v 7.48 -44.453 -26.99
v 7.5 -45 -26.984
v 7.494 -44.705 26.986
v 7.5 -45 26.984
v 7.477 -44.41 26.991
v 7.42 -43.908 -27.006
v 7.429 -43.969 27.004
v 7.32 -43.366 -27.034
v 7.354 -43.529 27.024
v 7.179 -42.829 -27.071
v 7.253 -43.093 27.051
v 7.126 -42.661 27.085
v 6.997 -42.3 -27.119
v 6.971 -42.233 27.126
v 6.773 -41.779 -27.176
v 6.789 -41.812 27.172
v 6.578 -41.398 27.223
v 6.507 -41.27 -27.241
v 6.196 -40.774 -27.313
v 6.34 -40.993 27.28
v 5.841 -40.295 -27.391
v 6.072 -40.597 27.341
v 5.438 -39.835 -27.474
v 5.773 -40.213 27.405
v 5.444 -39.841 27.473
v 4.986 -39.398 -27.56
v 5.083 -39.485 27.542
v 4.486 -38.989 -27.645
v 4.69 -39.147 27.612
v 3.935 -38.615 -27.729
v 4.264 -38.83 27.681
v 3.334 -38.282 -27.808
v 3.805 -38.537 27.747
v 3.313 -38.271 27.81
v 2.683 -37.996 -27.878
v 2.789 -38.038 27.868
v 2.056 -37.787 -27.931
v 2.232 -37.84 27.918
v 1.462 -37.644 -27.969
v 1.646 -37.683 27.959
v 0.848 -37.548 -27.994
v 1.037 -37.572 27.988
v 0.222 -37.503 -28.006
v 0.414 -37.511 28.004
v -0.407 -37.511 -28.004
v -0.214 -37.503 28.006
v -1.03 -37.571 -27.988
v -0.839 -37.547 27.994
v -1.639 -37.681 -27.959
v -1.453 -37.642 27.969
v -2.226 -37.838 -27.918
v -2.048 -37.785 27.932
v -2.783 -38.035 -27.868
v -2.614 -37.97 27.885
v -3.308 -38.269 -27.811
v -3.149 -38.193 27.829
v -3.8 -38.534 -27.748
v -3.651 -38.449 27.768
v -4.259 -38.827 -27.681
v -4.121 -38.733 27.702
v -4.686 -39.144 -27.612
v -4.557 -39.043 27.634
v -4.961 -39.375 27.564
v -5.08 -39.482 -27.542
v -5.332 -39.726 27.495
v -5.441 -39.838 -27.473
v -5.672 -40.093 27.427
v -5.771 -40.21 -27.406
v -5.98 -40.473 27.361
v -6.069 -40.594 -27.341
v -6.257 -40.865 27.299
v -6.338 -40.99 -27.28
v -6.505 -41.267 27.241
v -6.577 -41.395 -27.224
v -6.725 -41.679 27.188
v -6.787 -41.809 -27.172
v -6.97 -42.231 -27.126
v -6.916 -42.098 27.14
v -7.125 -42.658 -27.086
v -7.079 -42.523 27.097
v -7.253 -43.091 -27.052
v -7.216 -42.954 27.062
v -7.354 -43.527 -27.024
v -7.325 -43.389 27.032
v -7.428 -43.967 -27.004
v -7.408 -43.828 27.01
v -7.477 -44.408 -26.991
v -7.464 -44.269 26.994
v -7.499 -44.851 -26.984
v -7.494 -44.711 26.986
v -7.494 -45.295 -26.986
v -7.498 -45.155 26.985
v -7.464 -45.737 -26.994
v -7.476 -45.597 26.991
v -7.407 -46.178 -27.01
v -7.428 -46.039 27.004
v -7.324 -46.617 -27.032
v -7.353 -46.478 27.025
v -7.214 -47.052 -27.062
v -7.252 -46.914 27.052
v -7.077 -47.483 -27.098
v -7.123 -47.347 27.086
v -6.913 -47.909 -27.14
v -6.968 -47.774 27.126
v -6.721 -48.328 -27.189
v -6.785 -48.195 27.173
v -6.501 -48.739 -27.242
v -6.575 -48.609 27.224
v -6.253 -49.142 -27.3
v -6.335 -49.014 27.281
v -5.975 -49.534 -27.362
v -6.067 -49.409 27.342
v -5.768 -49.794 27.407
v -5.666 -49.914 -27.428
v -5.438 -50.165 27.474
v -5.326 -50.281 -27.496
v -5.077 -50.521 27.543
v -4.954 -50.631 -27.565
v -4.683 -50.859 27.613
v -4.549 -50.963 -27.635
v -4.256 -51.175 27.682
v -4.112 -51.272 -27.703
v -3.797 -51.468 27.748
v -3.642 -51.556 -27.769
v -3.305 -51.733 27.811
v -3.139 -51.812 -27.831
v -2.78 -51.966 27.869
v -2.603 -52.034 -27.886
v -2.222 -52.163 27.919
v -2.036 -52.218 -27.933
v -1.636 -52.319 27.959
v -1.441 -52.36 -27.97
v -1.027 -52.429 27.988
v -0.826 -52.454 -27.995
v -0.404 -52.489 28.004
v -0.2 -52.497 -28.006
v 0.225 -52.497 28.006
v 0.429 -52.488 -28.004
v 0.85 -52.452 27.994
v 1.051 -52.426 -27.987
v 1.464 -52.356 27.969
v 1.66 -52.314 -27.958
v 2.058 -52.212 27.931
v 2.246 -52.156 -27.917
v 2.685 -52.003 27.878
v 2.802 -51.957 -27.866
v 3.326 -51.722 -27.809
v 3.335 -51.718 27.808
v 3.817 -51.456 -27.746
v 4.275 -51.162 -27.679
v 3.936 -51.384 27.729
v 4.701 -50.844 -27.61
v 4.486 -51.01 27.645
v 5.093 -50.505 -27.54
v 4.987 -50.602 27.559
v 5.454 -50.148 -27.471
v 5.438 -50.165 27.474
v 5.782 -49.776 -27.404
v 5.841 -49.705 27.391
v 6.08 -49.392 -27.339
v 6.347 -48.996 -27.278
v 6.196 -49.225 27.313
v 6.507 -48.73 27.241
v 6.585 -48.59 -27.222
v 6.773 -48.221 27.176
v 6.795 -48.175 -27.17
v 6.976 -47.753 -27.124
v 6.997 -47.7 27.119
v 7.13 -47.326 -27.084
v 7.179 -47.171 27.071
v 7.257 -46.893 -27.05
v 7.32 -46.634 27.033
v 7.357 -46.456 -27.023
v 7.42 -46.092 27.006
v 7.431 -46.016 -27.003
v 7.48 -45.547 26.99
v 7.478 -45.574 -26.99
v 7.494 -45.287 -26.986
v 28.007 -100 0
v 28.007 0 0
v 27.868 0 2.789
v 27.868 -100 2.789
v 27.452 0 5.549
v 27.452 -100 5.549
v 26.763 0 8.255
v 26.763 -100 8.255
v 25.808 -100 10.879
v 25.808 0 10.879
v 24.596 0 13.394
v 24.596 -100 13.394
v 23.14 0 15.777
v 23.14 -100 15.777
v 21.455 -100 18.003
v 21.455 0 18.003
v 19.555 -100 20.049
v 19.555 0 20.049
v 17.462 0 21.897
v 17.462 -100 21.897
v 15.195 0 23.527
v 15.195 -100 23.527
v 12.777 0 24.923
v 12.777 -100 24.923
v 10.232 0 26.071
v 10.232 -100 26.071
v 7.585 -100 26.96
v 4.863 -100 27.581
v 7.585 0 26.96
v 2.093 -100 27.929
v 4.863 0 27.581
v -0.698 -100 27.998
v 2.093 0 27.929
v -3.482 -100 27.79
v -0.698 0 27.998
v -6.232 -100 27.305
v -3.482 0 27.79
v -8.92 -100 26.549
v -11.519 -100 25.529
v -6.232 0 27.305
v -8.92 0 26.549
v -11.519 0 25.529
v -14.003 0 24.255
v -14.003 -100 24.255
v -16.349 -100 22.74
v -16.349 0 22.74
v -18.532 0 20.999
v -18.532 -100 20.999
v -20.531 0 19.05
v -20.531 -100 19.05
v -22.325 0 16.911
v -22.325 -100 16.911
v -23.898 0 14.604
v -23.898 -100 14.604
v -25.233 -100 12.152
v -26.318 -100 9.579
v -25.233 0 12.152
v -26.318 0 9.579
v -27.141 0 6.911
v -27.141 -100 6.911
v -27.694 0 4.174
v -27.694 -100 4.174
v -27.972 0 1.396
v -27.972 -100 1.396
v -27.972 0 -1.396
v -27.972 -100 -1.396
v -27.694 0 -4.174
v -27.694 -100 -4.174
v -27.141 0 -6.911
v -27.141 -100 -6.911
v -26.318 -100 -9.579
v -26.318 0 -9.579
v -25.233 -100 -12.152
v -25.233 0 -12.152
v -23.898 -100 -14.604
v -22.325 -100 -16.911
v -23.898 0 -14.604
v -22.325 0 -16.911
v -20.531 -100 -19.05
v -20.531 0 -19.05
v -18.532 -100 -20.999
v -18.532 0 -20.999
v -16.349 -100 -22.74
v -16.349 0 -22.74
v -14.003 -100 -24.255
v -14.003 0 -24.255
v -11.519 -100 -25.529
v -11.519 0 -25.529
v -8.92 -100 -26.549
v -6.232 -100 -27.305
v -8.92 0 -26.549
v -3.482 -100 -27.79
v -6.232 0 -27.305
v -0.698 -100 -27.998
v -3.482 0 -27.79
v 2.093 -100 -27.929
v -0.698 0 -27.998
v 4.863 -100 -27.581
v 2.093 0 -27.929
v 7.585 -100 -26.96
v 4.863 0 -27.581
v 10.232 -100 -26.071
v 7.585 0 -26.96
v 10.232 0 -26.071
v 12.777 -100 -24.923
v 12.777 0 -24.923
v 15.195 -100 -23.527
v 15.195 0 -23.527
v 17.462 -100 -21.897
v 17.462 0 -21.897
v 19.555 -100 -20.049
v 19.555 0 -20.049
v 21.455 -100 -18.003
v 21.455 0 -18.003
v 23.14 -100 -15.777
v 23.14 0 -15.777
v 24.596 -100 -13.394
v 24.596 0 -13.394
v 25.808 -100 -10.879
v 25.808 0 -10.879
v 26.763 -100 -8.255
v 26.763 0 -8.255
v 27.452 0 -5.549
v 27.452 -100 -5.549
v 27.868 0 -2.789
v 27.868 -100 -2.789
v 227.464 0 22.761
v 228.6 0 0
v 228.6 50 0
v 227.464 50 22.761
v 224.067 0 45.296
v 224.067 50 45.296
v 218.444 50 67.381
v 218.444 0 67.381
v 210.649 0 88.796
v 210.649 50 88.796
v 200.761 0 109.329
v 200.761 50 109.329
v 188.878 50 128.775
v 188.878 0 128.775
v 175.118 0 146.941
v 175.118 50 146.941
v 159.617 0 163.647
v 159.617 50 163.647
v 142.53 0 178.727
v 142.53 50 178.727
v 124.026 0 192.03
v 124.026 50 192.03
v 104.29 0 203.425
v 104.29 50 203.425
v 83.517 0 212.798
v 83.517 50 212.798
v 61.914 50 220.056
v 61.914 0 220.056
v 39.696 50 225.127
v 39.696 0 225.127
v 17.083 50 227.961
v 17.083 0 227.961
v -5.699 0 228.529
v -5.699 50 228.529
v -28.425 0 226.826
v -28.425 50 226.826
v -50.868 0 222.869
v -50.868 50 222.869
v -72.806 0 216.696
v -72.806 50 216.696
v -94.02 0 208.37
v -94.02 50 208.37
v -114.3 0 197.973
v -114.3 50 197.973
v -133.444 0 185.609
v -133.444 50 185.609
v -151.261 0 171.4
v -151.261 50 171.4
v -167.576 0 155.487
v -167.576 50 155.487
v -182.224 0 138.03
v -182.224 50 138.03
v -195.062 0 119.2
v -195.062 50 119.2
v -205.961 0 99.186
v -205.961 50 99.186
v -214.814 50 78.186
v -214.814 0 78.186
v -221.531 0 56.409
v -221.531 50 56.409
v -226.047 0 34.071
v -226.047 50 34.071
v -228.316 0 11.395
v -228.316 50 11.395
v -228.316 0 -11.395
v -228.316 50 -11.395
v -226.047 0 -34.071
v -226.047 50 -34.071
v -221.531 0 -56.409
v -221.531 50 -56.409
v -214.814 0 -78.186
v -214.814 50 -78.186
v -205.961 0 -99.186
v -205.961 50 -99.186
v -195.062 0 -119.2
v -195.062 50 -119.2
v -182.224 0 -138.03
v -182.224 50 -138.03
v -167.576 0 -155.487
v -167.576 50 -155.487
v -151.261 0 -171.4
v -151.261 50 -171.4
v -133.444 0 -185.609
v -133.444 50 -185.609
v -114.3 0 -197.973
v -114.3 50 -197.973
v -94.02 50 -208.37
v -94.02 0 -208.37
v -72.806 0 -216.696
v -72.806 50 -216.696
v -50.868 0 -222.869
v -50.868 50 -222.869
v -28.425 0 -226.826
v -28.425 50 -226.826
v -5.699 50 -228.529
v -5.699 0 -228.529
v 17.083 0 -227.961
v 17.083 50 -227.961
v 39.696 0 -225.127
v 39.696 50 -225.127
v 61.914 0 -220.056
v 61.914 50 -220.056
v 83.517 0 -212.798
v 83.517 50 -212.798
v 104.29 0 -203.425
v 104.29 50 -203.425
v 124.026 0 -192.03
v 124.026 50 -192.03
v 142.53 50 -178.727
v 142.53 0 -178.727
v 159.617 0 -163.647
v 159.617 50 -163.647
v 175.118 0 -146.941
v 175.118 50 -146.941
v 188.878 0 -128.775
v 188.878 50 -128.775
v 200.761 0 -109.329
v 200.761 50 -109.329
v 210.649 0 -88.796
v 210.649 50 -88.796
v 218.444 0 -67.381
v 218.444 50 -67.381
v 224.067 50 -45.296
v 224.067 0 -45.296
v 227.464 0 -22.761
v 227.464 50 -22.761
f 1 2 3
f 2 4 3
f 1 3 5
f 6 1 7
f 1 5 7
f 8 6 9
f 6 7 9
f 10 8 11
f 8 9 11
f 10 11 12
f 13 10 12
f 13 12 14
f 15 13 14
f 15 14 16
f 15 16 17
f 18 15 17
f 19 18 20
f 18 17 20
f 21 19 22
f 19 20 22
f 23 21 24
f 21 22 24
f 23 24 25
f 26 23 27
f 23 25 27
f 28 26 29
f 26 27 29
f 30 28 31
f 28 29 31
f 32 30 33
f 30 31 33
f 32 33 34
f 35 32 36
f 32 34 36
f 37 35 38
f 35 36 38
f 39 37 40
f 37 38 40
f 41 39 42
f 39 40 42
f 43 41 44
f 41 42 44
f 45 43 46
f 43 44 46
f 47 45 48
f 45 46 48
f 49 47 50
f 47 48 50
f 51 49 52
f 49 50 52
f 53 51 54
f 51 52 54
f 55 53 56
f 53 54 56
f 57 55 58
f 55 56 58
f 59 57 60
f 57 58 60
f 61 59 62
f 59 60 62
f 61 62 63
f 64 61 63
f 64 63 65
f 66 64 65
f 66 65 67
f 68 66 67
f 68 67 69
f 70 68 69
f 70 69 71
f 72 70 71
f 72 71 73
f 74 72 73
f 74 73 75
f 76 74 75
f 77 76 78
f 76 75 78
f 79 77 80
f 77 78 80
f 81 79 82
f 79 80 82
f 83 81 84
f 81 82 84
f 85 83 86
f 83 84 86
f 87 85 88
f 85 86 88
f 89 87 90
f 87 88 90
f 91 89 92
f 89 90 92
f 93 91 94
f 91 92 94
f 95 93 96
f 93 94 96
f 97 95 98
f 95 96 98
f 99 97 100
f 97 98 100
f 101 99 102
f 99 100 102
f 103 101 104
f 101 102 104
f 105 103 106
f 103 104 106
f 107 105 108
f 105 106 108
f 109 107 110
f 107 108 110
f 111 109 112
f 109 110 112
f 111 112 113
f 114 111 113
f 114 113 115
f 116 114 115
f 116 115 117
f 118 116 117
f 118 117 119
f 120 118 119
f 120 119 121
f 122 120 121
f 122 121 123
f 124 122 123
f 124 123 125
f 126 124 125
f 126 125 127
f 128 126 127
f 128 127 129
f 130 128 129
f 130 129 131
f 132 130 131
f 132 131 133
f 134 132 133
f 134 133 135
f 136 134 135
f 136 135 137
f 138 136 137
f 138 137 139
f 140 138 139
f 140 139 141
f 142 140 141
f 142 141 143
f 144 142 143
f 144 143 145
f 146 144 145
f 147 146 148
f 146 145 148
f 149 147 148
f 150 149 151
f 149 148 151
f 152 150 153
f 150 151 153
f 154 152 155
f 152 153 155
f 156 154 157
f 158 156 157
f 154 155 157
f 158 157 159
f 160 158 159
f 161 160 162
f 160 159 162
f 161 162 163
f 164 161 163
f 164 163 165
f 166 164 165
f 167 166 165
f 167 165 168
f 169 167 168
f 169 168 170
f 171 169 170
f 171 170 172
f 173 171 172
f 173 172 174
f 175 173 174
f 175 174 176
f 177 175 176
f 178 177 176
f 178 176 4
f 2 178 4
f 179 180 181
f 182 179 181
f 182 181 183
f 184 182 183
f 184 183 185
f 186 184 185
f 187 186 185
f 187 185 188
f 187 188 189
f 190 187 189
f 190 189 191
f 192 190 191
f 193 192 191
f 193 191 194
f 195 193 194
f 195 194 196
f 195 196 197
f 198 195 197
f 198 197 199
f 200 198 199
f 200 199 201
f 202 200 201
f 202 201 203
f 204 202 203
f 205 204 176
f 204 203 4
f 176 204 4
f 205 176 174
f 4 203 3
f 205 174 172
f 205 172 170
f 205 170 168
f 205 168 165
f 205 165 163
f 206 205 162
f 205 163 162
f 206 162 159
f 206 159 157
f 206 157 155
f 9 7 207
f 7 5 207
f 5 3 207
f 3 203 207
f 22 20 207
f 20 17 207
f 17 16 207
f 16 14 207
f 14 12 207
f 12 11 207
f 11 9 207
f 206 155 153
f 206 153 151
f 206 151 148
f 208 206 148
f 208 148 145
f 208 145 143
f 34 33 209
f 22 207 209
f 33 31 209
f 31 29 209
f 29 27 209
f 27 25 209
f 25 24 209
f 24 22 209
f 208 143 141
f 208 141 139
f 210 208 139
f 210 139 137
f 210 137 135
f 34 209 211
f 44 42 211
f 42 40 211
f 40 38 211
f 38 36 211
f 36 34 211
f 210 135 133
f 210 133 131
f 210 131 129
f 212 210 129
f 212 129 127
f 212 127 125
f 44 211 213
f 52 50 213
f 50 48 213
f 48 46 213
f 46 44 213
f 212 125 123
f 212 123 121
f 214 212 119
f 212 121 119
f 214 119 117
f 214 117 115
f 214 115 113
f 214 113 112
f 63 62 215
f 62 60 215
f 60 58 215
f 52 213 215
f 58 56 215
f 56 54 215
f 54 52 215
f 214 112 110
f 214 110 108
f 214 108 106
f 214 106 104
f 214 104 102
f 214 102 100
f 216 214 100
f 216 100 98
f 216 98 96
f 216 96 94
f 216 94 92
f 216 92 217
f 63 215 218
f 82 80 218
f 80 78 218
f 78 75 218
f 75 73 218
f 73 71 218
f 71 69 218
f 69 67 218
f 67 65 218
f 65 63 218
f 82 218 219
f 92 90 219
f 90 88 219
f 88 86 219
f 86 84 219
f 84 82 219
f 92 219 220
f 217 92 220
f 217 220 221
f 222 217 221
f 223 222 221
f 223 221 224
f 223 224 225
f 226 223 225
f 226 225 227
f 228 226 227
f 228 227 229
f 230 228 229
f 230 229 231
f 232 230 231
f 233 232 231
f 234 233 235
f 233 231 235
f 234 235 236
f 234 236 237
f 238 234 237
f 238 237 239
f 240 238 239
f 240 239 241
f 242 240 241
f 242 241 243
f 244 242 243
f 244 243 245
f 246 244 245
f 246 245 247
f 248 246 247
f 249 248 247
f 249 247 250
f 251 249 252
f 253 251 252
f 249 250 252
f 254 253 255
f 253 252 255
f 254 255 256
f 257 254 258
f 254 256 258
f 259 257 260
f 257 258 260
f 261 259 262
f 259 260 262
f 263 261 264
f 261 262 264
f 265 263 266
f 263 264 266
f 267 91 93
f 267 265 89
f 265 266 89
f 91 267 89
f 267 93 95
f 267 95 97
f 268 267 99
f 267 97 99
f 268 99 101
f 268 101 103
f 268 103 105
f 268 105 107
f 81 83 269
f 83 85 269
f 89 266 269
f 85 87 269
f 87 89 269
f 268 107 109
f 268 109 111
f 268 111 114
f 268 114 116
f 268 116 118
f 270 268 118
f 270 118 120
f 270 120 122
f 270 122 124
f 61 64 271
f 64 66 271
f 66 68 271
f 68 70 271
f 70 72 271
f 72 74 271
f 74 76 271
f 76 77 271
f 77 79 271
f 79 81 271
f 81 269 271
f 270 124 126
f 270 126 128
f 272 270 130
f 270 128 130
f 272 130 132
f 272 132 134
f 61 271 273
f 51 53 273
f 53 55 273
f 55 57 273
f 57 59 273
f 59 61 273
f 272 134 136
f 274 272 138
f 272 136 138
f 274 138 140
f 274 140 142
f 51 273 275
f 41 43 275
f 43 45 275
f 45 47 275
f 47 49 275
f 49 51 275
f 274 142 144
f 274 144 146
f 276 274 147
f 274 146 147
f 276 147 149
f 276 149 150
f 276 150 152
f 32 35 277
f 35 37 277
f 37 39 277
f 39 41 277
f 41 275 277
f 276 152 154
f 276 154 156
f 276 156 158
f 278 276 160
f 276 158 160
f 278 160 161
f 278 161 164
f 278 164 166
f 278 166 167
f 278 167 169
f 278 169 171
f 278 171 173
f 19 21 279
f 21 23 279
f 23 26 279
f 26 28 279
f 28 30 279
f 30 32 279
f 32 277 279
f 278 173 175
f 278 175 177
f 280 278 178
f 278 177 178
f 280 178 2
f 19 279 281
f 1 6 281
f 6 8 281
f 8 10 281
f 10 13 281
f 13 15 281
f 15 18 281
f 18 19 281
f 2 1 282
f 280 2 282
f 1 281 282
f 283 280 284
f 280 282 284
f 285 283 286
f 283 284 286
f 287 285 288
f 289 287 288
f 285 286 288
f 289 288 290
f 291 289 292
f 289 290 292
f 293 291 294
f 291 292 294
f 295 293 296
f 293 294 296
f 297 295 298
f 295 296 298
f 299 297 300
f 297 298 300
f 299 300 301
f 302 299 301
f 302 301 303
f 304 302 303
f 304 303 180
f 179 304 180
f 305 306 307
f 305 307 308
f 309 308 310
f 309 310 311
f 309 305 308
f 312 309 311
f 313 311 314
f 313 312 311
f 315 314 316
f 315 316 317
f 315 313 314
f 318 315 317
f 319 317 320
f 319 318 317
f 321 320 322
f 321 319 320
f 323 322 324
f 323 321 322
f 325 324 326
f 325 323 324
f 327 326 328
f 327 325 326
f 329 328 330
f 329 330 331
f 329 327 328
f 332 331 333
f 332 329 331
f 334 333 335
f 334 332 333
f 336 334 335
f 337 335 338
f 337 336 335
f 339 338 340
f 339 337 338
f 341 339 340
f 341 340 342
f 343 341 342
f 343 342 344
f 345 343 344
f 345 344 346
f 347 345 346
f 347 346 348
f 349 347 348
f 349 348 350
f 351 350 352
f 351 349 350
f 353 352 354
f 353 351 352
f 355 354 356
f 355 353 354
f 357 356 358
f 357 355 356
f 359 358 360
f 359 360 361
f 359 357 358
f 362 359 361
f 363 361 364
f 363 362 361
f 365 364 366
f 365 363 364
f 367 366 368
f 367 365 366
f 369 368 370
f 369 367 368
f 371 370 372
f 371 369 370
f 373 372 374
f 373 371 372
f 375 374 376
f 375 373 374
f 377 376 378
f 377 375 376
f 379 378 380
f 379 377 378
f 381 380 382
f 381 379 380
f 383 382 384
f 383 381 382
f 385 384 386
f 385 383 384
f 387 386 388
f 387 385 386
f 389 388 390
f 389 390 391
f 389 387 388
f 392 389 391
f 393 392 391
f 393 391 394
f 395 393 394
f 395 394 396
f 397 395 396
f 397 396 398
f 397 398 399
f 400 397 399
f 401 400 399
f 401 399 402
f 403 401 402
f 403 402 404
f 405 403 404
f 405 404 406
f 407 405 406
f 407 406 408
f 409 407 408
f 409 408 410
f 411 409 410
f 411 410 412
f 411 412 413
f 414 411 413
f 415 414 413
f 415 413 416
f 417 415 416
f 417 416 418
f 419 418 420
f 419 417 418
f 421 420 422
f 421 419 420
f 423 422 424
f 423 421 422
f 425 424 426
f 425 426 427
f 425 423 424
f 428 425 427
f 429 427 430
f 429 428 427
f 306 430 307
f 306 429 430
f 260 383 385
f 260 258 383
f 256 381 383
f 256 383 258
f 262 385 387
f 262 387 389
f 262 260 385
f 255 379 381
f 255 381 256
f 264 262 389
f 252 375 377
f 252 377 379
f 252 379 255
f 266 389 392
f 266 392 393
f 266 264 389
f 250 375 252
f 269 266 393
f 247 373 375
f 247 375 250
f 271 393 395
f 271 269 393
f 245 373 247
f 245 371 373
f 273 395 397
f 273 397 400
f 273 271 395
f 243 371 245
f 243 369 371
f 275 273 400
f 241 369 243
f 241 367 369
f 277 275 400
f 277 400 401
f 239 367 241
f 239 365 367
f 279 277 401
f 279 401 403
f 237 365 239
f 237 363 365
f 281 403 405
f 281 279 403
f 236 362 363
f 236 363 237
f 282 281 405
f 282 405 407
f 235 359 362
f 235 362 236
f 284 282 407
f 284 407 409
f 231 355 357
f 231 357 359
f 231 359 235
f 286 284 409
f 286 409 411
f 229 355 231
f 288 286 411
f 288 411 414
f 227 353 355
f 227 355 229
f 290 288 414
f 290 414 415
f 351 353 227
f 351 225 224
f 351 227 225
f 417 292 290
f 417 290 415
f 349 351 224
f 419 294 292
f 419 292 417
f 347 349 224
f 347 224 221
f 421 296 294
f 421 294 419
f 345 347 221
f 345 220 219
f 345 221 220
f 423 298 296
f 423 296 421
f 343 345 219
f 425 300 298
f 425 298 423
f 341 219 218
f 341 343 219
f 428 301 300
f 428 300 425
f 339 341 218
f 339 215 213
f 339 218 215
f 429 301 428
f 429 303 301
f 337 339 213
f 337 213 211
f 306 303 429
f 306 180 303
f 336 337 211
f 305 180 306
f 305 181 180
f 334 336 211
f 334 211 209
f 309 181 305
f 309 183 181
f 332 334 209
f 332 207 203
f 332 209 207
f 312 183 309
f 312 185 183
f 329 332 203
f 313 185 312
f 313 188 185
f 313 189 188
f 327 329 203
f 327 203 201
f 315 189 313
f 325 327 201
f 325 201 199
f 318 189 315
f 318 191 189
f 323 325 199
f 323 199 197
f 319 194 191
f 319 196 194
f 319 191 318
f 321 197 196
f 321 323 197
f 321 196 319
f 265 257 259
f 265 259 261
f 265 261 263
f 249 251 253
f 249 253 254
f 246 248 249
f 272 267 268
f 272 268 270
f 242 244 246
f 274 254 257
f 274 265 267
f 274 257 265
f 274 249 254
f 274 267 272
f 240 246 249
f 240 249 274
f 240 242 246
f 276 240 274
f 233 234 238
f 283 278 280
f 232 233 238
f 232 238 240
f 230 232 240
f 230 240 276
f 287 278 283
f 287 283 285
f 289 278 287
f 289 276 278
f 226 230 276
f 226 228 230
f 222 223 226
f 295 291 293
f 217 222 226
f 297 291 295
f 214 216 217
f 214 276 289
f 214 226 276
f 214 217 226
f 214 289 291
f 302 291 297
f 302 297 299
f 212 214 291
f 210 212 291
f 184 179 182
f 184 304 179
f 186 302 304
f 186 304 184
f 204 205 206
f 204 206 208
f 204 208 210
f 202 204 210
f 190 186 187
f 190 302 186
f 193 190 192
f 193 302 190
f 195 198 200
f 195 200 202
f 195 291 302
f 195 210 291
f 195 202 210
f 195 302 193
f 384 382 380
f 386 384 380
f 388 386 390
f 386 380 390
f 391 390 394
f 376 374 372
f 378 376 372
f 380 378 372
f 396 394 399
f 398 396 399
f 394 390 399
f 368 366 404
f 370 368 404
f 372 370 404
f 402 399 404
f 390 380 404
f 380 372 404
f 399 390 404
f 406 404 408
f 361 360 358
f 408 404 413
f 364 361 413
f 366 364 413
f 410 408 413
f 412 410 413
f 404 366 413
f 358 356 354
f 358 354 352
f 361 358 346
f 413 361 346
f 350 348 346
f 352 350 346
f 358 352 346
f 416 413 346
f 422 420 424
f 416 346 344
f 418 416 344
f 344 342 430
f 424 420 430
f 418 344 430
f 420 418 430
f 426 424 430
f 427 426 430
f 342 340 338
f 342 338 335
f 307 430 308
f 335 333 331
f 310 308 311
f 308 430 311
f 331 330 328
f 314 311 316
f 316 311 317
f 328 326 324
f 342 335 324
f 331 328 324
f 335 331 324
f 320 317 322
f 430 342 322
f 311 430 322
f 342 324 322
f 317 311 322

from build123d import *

# Parameters (mm, degrees)
F1_R          = 28.006963647
F2_DEPTH      = 100
F0_R          = 228.6
F3_DEPTH      = 50
F4_R          = 7.5
F5_DEPTH      = 28.006963647
F5_DEPTH_BACK = 28.006963647


with BuildPart() as f2:
    # F1 (on Front) → F2 (new body)
    with BuildSketch(Plane.XZ):
        Circle(F1_R)
    extrude(amount=F2_DEPTH)

    # F0 (on Front) → F3 (join)
    with BuildSketch(Plane.XZ):
        Circle(F0_R)
    extrude(amount=-F3_DEPTH)

    # F4 (on Top) → F5 (cut, two sides)
    with BuildSketch(Plane.XY) as f5_sk:
        with Locations((0, -45)):
            Circle(F4_R)
    extrude(amount=-F5_DEPTH, mode=Mode.SUBTRACT)
    extrude(f5_sk.sketch, amount=F5_DEPTH_BACK, mode=Mode.SUBTRACT)


solid = f2.part
